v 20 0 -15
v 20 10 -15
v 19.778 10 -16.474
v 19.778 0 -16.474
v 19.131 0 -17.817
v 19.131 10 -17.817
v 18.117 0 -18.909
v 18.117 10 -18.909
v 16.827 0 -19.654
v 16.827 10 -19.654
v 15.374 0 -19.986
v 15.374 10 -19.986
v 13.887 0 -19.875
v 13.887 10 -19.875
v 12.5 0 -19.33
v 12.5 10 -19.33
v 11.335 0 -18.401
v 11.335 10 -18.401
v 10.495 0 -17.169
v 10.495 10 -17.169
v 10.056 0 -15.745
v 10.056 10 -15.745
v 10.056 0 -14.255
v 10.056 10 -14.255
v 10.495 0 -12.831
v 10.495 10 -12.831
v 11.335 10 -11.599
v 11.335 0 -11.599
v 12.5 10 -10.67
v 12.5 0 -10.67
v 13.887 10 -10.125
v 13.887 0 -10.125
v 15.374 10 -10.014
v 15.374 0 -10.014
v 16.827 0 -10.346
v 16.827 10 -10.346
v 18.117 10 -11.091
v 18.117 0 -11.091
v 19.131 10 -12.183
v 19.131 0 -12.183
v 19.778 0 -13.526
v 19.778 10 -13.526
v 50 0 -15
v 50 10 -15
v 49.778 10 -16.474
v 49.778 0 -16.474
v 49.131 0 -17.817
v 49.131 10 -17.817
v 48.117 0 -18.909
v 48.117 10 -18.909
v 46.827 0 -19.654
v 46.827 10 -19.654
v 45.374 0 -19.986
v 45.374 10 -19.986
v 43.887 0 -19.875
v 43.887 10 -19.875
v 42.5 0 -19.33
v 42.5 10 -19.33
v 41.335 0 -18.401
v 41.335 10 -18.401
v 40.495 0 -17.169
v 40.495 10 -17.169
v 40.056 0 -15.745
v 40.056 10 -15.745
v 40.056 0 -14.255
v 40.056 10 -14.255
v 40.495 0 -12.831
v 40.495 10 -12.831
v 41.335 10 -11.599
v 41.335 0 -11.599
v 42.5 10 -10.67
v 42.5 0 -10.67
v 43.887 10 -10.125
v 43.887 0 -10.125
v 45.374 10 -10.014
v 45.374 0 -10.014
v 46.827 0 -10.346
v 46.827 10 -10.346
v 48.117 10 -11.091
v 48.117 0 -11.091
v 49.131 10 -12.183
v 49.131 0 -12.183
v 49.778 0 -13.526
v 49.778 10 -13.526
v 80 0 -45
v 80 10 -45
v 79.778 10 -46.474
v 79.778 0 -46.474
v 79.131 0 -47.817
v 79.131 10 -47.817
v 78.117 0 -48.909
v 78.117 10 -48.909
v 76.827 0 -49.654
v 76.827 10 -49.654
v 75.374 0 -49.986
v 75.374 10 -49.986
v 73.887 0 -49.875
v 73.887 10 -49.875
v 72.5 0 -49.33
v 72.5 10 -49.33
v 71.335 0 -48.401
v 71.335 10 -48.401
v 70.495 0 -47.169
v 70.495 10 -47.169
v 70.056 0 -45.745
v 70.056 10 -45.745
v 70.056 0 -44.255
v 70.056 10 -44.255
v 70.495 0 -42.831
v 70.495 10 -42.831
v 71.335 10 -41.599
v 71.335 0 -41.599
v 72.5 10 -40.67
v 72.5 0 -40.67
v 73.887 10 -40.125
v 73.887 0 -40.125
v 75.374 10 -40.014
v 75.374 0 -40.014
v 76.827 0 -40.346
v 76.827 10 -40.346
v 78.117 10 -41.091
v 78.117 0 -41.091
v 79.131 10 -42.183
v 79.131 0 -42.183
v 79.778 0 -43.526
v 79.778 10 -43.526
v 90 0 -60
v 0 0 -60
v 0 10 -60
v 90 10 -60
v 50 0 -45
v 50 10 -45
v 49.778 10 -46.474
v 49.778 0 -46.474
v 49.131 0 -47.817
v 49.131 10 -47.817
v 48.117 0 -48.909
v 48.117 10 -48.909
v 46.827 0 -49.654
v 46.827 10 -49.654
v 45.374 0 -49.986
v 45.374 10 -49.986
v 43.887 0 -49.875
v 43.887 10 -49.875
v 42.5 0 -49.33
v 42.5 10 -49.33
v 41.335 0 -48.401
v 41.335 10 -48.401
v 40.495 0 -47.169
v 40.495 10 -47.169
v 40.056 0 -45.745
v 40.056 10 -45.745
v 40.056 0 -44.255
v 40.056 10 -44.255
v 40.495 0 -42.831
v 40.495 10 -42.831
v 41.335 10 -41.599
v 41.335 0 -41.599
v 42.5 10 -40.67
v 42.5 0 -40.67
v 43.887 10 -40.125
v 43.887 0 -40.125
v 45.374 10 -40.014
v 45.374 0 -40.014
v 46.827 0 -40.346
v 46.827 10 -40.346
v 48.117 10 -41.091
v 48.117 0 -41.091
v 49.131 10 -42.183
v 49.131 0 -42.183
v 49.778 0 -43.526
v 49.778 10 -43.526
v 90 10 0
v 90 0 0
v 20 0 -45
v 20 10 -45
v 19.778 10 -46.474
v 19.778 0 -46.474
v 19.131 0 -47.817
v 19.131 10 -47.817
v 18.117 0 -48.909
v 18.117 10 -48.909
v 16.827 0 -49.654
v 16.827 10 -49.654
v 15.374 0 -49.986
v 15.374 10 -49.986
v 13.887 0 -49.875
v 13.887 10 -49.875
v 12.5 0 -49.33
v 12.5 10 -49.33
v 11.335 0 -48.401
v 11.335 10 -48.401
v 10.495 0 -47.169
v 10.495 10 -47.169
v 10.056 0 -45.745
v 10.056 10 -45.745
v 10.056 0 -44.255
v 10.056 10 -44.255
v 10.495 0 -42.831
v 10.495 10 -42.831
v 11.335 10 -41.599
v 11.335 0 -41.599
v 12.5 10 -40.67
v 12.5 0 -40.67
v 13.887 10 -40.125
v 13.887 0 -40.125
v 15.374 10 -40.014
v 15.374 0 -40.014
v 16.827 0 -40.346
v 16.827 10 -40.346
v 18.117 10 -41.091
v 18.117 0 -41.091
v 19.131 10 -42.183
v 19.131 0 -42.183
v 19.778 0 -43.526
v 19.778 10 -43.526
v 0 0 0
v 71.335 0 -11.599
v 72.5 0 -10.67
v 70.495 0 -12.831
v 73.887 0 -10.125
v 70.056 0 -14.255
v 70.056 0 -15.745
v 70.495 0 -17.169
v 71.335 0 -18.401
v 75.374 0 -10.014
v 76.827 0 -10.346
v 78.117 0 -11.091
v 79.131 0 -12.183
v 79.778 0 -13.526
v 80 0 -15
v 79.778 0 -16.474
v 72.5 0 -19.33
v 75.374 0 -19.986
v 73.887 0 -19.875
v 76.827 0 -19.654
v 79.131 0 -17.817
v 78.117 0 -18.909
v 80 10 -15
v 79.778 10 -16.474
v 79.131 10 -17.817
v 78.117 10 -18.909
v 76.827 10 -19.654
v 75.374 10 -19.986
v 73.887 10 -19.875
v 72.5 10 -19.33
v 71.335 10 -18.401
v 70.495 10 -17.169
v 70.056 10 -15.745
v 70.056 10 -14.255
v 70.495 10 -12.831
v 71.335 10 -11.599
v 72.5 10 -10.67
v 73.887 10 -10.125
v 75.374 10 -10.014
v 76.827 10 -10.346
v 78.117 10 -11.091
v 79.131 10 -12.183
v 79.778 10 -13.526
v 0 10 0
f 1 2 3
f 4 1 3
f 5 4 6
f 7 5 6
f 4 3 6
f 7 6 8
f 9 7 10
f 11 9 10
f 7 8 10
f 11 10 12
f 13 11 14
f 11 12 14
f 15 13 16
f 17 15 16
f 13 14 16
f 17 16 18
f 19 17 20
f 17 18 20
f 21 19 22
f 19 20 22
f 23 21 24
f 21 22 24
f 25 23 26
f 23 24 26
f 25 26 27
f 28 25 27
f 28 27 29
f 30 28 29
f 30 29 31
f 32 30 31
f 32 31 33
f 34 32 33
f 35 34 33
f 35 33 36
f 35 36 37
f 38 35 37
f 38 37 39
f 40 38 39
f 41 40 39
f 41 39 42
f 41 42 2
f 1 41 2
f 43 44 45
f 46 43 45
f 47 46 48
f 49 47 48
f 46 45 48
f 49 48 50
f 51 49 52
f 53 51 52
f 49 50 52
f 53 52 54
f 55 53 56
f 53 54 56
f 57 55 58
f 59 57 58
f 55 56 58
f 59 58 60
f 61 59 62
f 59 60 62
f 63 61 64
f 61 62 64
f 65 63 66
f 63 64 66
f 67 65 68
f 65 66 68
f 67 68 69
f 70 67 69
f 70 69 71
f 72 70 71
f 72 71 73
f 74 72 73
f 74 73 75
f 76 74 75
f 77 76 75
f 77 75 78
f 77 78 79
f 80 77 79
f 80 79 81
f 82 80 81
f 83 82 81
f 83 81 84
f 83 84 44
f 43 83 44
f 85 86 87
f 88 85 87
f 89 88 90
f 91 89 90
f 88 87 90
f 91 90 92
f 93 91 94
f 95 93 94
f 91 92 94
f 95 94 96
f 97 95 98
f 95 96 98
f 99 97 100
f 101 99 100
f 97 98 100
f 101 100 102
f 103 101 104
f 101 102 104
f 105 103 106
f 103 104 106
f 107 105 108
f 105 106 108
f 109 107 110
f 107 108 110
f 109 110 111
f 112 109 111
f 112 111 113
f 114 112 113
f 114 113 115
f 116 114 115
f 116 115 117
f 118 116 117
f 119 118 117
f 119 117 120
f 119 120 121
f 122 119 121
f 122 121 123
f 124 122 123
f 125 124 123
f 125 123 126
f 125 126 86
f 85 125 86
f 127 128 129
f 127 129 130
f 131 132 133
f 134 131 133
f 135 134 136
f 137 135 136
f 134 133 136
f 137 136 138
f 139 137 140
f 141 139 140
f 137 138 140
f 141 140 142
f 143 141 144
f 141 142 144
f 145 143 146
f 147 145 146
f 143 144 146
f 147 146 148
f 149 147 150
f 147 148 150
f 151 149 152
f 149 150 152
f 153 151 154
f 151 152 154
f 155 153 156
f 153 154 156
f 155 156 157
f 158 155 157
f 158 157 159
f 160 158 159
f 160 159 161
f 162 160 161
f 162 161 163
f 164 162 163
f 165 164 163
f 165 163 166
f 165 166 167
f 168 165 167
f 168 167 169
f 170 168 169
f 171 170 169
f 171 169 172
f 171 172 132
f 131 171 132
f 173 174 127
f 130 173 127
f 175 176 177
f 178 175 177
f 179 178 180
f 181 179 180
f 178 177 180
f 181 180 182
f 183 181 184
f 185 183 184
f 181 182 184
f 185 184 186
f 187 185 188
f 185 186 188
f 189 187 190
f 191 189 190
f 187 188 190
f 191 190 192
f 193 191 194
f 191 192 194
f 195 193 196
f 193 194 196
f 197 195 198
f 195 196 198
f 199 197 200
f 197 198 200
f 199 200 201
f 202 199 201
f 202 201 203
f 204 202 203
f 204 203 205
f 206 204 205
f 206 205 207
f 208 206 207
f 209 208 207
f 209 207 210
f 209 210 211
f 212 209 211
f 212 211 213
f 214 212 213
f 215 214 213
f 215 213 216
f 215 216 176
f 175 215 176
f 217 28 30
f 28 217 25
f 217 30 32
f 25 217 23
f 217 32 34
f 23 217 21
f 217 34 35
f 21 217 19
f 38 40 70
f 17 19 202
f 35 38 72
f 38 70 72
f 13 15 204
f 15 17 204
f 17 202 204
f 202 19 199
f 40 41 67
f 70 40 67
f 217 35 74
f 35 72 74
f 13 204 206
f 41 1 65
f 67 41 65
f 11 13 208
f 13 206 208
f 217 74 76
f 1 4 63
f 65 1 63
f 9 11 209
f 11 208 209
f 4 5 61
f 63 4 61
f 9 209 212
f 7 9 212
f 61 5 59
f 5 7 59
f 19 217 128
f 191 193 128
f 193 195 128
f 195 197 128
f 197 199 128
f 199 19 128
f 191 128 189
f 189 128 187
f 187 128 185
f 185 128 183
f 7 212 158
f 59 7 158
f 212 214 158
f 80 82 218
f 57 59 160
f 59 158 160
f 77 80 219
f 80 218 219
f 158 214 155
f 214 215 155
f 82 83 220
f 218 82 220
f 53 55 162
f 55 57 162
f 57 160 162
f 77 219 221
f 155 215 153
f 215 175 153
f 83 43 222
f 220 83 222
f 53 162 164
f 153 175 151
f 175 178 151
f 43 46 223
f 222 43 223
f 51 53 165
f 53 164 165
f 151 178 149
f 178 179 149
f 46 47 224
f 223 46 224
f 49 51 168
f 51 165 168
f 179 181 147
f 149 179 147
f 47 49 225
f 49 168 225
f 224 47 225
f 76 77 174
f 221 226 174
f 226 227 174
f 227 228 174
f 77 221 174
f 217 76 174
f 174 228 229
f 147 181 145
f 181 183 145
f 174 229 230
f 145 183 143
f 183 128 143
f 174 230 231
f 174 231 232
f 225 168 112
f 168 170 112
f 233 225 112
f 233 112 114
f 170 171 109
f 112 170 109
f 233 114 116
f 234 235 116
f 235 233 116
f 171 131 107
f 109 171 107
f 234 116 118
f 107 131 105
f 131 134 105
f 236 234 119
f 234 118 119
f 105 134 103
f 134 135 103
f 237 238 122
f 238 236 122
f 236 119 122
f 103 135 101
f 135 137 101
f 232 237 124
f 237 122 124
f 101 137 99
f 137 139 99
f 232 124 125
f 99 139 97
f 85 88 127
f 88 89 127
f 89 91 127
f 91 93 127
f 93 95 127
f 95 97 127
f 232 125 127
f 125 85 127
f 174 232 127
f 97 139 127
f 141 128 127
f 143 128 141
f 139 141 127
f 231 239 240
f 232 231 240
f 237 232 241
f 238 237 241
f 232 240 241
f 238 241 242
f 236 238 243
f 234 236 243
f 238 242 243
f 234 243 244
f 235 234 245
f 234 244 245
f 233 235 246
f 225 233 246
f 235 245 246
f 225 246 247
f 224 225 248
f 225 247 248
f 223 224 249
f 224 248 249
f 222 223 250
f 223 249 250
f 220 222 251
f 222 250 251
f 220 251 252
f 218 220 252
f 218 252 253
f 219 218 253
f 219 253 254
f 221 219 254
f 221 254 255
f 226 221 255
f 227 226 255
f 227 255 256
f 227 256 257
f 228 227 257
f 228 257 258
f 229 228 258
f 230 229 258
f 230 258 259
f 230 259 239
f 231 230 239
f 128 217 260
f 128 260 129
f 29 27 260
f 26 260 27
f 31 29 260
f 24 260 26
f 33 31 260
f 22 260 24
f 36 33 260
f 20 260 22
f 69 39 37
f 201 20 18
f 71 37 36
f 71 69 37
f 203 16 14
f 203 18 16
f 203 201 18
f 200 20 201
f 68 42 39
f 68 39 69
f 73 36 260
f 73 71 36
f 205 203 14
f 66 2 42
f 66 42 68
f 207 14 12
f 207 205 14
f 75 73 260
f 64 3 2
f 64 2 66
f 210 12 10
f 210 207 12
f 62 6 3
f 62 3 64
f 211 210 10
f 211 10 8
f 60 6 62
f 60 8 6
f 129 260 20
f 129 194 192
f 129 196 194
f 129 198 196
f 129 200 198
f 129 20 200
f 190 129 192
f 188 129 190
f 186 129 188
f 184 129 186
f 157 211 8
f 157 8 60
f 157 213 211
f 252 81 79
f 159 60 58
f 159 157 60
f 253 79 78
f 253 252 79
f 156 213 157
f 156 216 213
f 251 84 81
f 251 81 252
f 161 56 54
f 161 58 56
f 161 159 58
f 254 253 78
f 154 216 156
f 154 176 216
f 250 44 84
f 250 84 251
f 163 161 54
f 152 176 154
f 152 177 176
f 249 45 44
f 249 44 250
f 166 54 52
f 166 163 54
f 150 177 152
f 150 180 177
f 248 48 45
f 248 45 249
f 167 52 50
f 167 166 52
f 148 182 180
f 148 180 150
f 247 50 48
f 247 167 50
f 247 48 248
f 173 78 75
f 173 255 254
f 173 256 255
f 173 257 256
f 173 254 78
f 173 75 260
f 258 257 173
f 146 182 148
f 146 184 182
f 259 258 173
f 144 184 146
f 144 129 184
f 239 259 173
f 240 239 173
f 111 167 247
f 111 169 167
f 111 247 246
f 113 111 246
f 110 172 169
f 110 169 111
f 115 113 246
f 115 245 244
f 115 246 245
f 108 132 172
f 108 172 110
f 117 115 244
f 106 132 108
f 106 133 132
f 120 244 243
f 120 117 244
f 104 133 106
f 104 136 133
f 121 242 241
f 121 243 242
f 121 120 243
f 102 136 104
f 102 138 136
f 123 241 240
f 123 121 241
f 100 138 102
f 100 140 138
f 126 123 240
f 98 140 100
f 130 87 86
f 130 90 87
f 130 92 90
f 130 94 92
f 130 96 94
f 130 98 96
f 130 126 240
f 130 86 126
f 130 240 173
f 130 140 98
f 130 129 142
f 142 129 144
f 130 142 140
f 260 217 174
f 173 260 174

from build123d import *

# Parameters (mm, degrees)
SKETCH1_W            = 90
SKETCH1_H            = 60
BOSS_EXTRUDE1_DEPTH  = 10
SKETCH2_R            = 5
CUT_EXTRUDE1_DEPTH   = 11
LPATTERN1_COUNT      = 4
LPATTERN1_PITCH      = 30
LPATTERN1_COUNT_DIR2 = 4
LPATTERN1_PITCH_DIR2 = 30


with BuildPart() as part:
    # Sketch1 → Boss-Extrude1 (new body)
    with BuildSketch(Plane(origin=(0, 0, 0), x_dir=(1, 0, 0), z_dir=(0, 1, 0))):
        with Locations((45, 30)):
            Rectangle(SKETCH1_W, SKETCH1_H)
    extrude(amount=BOSS_EXTRUDE1_DEPTH)

    # Sketch2 → Cut-Extrude1 (cut, through all)
    with BuildSketch(Plane(origin=(0, 10, 0), x_dir=(1, 0, 0), z_dir=(0, 1, 0))):
        with Locations((15, 15)):
            Circle(SKETCH2_R)
    cut_extrude1 = extrude(amount=-CUT_EXTRUDE1_DEPTH, mode=Mode.SUBTRACT)

    # LPattern1: Cut-Extrude1 4 × 4
    with Locations(*[(i * LPATTERN1_PITCH, 0, -j * LPATTERN1_PITCH_DIR2) for i in range(LPATTERN1_COUNT) for j in range(LPATTERN1_COUNT_DIR2) if (i, j) != (0, 0)]):
        add(cut_extrude1, mode=Mode.SUBTRACT)


solid = part.part
